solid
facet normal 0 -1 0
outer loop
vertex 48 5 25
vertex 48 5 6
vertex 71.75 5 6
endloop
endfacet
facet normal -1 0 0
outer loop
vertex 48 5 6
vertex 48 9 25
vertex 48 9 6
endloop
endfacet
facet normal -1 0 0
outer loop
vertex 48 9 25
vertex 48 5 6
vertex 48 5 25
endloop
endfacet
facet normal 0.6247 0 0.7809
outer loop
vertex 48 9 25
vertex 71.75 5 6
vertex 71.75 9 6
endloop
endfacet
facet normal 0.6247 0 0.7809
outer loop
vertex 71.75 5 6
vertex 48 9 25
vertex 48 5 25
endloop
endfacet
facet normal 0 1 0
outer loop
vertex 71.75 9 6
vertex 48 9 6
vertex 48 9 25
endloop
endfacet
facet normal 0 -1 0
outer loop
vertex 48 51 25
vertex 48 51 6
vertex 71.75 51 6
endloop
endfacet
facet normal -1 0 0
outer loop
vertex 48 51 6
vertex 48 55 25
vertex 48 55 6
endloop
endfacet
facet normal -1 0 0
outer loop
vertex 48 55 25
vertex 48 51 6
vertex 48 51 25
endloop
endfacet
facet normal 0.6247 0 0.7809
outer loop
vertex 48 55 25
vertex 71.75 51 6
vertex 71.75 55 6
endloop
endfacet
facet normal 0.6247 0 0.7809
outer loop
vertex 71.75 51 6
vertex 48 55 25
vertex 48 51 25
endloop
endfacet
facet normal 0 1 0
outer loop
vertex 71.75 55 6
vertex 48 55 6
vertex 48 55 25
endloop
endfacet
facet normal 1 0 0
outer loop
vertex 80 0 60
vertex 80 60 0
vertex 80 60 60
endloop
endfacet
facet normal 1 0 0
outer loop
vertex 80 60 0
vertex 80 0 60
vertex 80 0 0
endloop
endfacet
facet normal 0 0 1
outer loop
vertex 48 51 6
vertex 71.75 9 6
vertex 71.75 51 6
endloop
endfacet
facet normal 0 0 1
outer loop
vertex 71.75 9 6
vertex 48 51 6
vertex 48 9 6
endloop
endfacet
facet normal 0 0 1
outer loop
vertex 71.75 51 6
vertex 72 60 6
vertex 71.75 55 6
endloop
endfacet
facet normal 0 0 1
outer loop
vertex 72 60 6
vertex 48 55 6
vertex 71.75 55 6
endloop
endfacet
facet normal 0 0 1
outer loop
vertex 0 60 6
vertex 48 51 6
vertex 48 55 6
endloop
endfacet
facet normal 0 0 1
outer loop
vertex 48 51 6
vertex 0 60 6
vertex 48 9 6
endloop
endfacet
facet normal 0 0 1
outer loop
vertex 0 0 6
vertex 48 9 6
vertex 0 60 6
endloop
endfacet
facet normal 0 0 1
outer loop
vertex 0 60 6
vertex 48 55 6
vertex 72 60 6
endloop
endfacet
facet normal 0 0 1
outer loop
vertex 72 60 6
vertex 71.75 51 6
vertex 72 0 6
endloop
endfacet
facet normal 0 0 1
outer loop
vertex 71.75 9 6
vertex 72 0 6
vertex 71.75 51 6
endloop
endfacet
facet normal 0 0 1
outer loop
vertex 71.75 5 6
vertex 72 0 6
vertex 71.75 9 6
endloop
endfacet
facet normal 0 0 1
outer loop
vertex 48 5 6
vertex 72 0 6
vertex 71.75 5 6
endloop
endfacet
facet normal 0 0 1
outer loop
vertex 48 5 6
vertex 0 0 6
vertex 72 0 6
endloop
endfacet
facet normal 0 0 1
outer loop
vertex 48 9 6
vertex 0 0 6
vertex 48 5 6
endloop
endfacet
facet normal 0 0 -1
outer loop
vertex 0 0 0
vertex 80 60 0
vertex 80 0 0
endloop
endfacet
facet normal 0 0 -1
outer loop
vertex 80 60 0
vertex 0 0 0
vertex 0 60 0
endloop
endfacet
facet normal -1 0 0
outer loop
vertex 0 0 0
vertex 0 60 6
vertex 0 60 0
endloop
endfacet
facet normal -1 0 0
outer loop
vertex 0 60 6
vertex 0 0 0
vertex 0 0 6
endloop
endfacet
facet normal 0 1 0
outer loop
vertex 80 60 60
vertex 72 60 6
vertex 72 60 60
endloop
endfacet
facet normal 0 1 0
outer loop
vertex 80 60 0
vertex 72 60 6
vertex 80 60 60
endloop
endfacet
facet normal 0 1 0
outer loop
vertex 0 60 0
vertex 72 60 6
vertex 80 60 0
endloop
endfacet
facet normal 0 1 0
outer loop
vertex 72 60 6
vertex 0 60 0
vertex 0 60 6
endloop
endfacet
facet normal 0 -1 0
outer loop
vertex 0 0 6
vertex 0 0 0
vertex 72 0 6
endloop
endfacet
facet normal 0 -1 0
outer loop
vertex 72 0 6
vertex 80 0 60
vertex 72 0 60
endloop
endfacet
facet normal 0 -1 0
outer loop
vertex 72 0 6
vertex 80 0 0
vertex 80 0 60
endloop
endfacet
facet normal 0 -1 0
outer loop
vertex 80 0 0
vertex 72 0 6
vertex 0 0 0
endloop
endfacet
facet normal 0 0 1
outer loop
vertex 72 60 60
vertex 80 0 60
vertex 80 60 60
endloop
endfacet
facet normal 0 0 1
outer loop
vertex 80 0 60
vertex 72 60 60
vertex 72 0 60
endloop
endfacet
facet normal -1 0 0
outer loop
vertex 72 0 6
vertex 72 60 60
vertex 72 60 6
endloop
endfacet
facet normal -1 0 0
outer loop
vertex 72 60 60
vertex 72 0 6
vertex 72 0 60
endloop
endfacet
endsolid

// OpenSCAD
$fn = 32;

// ----------------------------------------------------------------------
// Rib bracket: 2-gusset L bracket
// ----------------------------------------------------------------------

// --- parameters (mm) ---
base_l = 80;              // foot length, X
base_w = 60;              // foot width, Y
base_t = 6;               // foot thickness
plate_t = 8;              // upright plate thickness
plate_h = 60;             // overall height
gus_l = 24;               // gusset leg along the foot
gus_h = 20;               // gusset height
gus_t = 4;                // gusset thickness
gus_edge = 5;             // gusset margin from the foot edge
n_gus = 2;                // gusset count
fit_tol = 0.02;           // tolerance for press fits, mm
free_tol = 0.2;           // tolerance for clearance fits, mm

gus_pitch = (base_w - 2 * gus_edge - gus_t) / (n_gus - 1);  // gusset pitch

union() {
  cube([base_l, base_w, base_t]);
  translate([base_l - plate_t, 0, base_t - 1])
    cube([plate_t, base_w, plate_h - base_t + 1]);
  for (i = [0 : n_gus - 1])
    translate([base_l - plate_t - gus_l, gus_edge + i * gus_pitch, base_t - 1])
      rotate([-90, 0, 0])
        linear_extrude(height = gus_t)
          polygon(points = [[0, 0], [gus_l + 1, 0], [0, -gus_h]]);
}
